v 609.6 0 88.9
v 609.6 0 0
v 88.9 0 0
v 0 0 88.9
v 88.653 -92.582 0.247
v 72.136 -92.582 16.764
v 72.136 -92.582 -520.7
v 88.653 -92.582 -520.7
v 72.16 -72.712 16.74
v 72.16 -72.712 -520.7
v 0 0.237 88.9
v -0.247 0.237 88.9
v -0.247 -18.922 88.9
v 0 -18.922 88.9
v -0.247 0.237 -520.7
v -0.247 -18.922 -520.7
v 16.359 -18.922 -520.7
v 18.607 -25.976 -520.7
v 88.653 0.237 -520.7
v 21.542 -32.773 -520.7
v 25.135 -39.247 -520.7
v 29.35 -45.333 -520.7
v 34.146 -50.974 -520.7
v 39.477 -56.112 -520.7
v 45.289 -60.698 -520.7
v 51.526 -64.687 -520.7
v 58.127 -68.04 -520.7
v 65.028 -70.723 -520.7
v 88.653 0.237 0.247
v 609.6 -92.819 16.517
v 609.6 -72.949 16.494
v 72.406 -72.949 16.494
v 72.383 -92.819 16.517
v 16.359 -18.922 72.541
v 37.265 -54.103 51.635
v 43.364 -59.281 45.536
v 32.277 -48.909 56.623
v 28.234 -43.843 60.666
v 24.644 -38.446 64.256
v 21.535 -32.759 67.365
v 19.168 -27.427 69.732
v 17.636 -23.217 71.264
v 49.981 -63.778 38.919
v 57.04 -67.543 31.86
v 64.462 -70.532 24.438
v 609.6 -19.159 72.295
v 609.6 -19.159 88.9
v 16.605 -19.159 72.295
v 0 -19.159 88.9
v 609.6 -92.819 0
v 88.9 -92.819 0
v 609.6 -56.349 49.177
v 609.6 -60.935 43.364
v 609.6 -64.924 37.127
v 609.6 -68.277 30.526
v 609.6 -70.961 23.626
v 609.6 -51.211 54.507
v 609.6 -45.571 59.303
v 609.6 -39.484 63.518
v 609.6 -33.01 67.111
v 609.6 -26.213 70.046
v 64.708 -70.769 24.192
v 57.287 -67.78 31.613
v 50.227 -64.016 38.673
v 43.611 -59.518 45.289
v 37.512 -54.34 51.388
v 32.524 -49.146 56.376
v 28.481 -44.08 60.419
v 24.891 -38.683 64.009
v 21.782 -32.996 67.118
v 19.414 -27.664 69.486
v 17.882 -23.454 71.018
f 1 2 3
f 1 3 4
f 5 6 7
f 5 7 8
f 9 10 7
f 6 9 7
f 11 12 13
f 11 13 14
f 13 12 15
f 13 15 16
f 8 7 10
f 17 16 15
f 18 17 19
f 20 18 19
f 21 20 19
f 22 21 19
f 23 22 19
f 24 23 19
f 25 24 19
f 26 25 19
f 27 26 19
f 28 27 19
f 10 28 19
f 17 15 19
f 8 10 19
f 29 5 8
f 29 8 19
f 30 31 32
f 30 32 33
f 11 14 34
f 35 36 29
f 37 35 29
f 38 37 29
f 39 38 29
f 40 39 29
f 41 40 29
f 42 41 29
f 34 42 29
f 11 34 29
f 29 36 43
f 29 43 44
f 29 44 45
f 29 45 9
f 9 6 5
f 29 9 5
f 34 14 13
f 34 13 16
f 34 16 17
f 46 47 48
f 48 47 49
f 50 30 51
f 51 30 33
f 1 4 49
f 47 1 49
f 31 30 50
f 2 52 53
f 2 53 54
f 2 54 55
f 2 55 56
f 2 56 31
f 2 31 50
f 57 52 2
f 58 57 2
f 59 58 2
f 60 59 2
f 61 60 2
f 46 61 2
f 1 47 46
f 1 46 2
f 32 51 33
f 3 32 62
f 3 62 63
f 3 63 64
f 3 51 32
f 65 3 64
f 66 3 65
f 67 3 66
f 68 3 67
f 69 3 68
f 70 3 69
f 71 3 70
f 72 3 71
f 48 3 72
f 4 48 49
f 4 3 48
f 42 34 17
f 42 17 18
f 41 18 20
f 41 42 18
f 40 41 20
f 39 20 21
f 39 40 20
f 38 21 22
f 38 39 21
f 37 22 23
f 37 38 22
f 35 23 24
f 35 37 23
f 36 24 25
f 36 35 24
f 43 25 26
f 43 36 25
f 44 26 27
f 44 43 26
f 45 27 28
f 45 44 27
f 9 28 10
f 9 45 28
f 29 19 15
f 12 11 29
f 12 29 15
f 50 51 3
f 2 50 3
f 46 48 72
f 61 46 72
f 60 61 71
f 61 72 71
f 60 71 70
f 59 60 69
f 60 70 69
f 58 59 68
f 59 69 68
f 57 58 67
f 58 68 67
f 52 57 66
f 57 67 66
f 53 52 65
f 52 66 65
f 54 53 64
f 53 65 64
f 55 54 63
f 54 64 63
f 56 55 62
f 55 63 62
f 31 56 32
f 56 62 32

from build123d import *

# Parameters (mm, degrees)
F1_DEPTH = 609.6
F3_DEPTH = 92.819936
F6_DEPTH = 609.6
F9_DEPTH = 101.6


with BuildPart() as f1:
    # F0 (on Right) → F1 (new body)
    with BuildSketch(Plane.YZ):
        with BuildLine():
            Line((-19.158843, 88.9), (-19.158843, 72.294541))
            ThreePointArc((-19.158843, 72.294541), (-53.845949, 51.905449), (-72.948752, 16.49368))
            Line((-72.948752, 16.49368), (-92.818936, 16.517246))
            Line((-92.818936, 16.517246), (-92.818936, 0))
            Line((-92.818936, 0), (0, 0))
            Line((0, 0), (0, 88.9))
            Line((0, 88.9), (-19.158843, 88.9))
        make_face()
    extrude(amount=F1_DEPTH)

    # F2 (on Front) → F3 (cut, through all)
    with BuildSketch(Plane.XZ):
        Polygon((88.9, 0), (0, 88.9), (0, 0), align=None)
    extrude(amount=F3_DEPTH, mode=Mode.SUBTRACT)


with BuildPart() as f6:
    # F5 (on offset) → F6 (new body)
    with BuildSketch(Plane.XY.offset(88.9)):
        with BuildLine():
            Line((-0.246732, -18.921724), (16.358727, -18.921724))
            ThreePointArc((16.358727, -18.921724), (36.747819, -53.608831), (72.159588, -72.711633))
            Line((72.159588, -72.711633), (72.136022, -92.581817))
            Line((72.136022, -92.581817), (88.653268, -92.581817))
            Line((88.653268, -92.581817), (88.653268, 0.237119))
            Line((88.653268, 0.237119), (-0.246732, 0.237119))
            Line((-0.246732, 0.237119), (-0.246732, -18.921724))
        make_face()
    extrude(amount=-F6_DEPTH)

    # F8 (on Front) → F9 (cut, symmetric)
    with BuildSketch(Plane.XZ):
        Polygon((88.9, 88.9), (0, 88.9), (88.9, 0), align=None)
    extrude(amount=F9_DEPTH, both=True, mode=Mode.SUBTRACT)


with BuildPart() as f1_1:
    # F7: moved
    add(f1.part.moved(Location((175.26, 0, 0))))


with BuildPart() as f1_2:
    # F10: moved
    add(f1_1.part.moved(Location((-175.26, 0, 0))))


solid = Compound([f6.part, f1_2.part])
